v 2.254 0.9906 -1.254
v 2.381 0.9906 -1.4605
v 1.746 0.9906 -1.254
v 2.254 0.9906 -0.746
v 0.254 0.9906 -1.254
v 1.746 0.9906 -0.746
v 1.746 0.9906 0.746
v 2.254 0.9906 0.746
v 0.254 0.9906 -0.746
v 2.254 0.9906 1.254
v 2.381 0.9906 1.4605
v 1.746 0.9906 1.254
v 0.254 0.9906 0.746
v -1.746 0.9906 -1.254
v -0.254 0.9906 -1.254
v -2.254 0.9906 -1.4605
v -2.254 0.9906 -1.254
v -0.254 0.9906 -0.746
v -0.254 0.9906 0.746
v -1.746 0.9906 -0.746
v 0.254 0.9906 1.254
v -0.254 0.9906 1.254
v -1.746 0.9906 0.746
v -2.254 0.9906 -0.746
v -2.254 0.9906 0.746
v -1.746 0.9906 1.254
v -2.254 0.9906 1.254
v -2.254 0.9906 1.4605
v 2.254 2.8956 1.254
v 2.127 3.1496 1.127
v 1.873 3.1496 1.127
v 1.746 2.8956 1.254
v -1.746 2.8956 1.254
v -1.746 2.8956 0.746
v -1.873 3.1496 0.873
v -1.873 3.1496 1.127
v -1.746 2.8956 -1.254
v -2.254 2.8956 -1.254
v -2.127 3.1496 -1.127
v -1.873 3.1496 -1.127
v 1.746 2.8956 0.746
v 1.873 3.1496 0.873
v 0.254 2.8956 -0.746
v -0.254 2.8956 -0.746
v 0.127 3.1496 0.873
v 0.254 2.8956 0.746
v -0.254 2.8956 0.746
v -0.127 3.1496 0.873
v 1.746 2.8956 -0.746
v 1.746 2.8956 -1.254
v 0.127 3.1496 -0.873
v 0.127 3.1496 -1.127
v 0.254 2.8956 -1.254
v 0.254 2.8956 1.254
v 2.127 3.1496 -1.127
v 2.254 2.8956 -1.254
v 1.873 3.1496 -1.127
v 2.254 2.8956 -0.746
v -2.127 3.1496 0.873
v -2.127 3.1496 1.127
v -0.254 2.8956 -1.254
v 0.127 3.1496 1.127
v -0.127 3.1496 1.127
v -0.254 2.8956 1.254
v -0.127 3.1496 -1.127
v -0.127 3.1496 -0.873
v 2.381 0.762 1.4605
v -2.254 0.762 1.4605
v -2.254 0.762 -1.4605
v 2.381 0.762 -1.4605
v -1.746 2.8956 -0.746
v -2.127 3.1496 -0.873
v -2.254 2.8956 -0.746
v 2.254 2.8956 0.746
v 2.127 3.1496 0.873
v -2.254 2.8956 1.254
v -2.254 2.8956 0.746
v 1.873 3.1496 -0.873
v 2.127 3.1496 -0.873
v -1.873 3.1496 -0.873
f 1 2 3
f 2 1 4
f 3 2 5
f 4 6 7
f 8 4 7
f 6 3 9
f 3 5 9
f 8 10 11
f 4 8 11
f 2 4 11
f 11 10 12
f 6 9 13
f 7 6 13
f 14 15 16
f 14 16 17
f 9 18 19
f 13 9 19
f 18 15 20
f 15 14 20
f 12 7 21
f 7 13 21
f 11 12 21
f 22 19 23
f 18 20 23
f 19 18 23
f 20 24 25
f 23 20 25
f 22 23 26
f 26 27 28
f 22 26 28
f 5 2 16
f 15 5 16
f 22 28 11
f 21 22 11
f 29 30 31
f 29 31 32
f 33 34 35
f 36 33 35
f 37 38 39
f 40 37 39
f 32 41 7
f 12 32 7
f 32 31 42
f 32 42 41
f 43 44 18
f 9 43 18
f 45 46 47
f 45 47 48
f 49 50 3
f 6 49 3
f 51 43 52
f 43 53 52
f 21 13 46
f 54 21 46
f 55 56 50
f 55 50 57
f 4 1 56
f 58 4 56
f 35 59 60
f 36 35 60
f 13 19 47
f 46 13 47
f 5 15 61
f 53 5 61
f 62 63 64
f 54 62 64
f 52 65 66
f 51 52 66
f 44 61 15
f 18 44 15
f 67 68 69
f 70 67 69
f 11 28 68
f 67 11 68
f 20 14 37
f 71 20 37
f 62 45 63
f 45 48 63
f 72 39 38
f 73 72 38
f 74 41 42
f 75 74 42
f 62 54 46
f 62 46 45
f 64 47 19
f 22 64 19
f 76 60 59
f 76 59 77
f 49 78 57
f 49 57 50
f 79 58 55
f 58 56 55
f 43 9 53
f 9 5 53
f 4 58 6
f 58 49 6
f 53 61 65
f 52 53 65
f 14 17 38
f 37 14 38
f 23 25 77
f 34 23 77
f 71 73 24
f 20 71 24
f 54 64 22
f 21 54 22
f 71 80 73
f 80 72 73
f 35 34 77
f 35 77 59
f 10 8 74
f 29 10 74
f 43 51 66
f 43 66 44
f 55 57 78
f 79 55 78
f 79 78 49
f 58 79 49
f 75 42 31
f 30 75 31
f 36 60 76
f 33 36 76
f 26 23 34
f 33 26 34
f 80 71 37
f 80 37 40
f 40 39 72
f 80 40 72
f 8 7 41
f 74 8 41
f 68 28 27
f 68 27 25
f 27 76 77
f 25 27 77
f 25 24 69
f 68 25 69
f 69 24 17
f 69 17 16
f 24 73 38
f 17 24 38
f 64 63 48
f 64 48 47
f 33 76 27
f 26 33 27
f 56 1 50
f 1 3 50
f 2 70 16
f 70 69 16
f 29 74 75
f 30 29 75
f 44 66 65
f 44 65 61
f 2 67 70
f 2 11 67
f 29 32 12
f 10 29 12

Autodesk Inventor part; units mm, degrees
sketch "Sketch_2" plane through (-2.254, 0, 0) normal (1, 0, 0) x (0, 0, -1)
  line L0 (-1.4605, 0.762) -> (1.4605, 0.762)
  line L1 (1.4605, 0.762) -> (1.4605, 0.9906)
  line L2 (1.4605, 0.9906) -> (1.254, 0.9906)
  line L3 (1.254, 0.9906) -> (1.254, 2.8956)
  line L4 (1.254, 2.8956) -> (1.127, 3.1496)
  line L5 (1.127, 3.1496) -> (0.873, 3.1496)
  line L6 (0.873, 3.1496) -> (0.746, 2.8956)
  line L7 (0.746, 2.8956) -> (0.746, 0.9906)
  line L8 (0.746, 0.9906) -> (-0.746, 0.9906)
  line L9 (-0.746, 0.9906) -> (-0.746, 2.8956)
  line L10 (-0.746, 2.8956) -> (-0.873, 3.1496)
  line L11 (-0.873, 3.1496) -> (-1.127, 3.1496)
  line L12 (-1.127, 3.1496) -> (-1.254, 2.8956)
  line L13 (-1.254, 2.8956) -> (-1.254, 0.9906)
  line L14 (-1.254, 0.9906) -> (-1.4605, 0.9906)
  line L15 (-1.4605, 0.9906) -> (-1.4605, 0.762)
extrude "Extrusion1" add sketch "Sketch_2" along normal blind 4.635
sketch "Sketch_1" plane through (0, 0, 0) normal (0, 0, 1) x (1, 0, 0)
  line L0 (-109.4334, 38.1) -> (-109.4334, -38.1)
  line L1 (-109.4334, -38.1) -> (56.7986, -38.1)
  line L2 (56.7986, -38.1) -> (56.7986, 38.1)
  line L3 (56.7986, 38.1) -> (-109.4334, 38.1)
  line L4 (-100.4603, 0.762) -> (-100.2538, 0.762)
  line L5 (-100.2538, 0.762) -> (-100.2538, -2.032)
  line L6 (-100.2538, -2.032) -> (-100.1268, -2.286)
  line L7 (-100.1268, -2.286) -> (-99.8728, -2.286)
  line L8 (-99.8728, -2.286) -> (-99.7458, -2.032)
  line L9 (-99.7458, -2.032) -> (-99.7458, 0.762)
  line L10 (-99.7458, 0.762) -> (-98.2538, 0.762)
  line L11 (-98.2538, 0.762) -> (-98.2538, -2.032)
  line L12 (-98.2538, -2.032) -> (-98.1268, -2.286)
  line L13 (-98.1268, -2.286) -> (-97.8728, -2.286)
  line L14 (-97.8728, -2.286) -> (-97.7458, -2.032)
  line L15 (-97.7458, -2.032) -> (-97.7458, 0.762)
  line L16 (-97.7458, 0.762) -> (-96.2538, 0.762)
  line L17 (-96.2538, 0.762) -> (-96.2538, -2.032)
  line L18 (-96.2538, -2.032) -> (-96.1268, -2.286)
  line L19 (-96.1268, -2.286) -> (-95.8728, -2.286)
  line L20 (-95.8728, -2.286) -> (-95.7458, -2.032)
  line L21 (-95.7458, -2.032) -> (-95.7458, 0.762)
  line L22 (-95.7458, 0.762) -> (-94.2538, 0.762)
  line L23 (-94.2538, 0.762) -> (-94.2538, -2.032)
  line L24 (-94.2538, -2.032) -> (-94.1268, -2.286)
  line L25 (-94.1268, -2.286) -> (-93.8728, -2.286)
  line L26 (-93.8728, -2.286) -> (-93.7458, -2.032)
  line L27 (-93.7458, -2.032) -> (-93.7458, 0.762)
  line L28 (-93.7458, 0.762) -> (-92.2538, 0.762)
  line L29 (-92.2538, 0.762) -> (-92.2538, -2.032)
  line L30 (-92.2538, -2.032) -> (-92.1268, -2.286)
  line L31 (-92.1268, -2.286) -> (-91.8728, -2.286)
  line L32 (-91.8728, -2.286) -> (-91.7458, -2.032)
  line L33 (-91.7458, -2.032) -> (-91.7458, 0.762)
  line L34 (-91.7458, 0.762) -> (-90.2538, 0.762)
  line L35 (-90.2538, 0.762) -> (-90.2538, -2.032)
  line L36 (-90.2538, -2.032) -> (-90.1268, -2.286)
  line L37 (-90.1268, -2.286) -> (-89.8728, -2.286)
  line L38 (-89.8728, -2.286) -> (-89.7458, -2.032)
  line L39 (-89.7458, -2.032) -> (-89.7458, 0.762)
  line L40 (-89.7458, 0.762) -> (-88.2538, 0.762)
  line L41 (-88.2538, 0.762) -> (-88.2538, -2.032)
  line L42 (-88.2538, -2.032) -> (-88.1268, -2.286)
  line L43 (-88.1268, -2.286) -> (-87.8728, -2.286)
  line L44 (-87.8728, -2.286) -> (-87.7458, -2.032)
  line L45 (-87.7458, -2.032) -> (-87.7458, 0.762)
  line L46 (-87.7458, 0.762) -> (-86.2538, 0.762)
  line L47 (-86.2538, 0.762) -> (-86.2538, -2.032)
  line L48 (-86.2538, -2.032) -> (-86.1268, -2.286)
  line L49 (-86.1268, -2.286) -> (-85.8728, -2.286)
  line L50 (-85.8728, -2.286) -> (-85.7458, -2.032)
  line L51 (-85.7458, -2.032) -> (-85.7458, 0.762)
  line L52 (-85.7458, 0.762) -> (-84.2538, 0.762)
  line L53 (-84.2538, 0.762) -> (-84.2538, -2.032)
  line L54 (-84.2538, -2.032) -> (-84.1268, -2.286)
  line L55 (-84.1268, -2.286) -> (-83.8728, -2.286)
  line L56 (-83.8728, -2.286) -> (-83.7458, -2.032)
  line L57 (-83.7458, -2.032) -> (-83.7458, 0.762)
  line L58 (-83.7458, 0.762) -> (-82.2538, 0.762)
  line L59 (-82.2538, 0.762) -> (-82.2538, -2.032)
  line L60 (-82.2538, -2.032) -> (-82.1268, -2.286)
  line L61 (-82.1268, -2.286) -> (-81.8728, -2.286)
  line L62 (-81.8728, -2.286) -> (-81.7458, -2.032)
  line L63 (-81.7458, -2.032) -> (-81.7458, 0.762)
  line L64 (-81.7458, 0.762) -> (-80.2538, 0.762)
  line L65 (-80.2538, 0.762) -> (-80.2538, -2.032)
  line L66 (-80.2538, -2.032) -> (-80.1268, -2.286)
  line L67 (-80.1268, -2.286) -> (-79.8728, -2.286)
  line L68 (-79.8728, -2.286) -> (-79.7458, -2.032)
  line L69 (-79.7458, -2.032) -> (-79.7458, 0.762)
  line L70 (-79.7458, 0.762) -> (-78.2538, 0.762)
  line L71 (-78.2538, 0.762) -> (-78.2538, -2.032)
  line L72 (-78.2538, -2.032) -> (-78.1268, -2.286)
  line L73 (-78.1268, -2.286) -> (-77.8728, -2.286)
  line L74 (-77.8728, -2.286) -> (-77.7458, -2.032)
  line L75 (-77.7458, -2.032) -> (-77.7458, 0.762)
  line L76 (-77.7458, 0.762) -> (-76.2538, 0.762)
  line L77 (-76.2538, 0.762) -> (-76.2538, -2.032)
  line L78 (-76.2538, -2.032) -> (-76.1268, -2.286)
  line L79 (-76.1268, -2.286) -> (-75.8728, -2.286)
  line L80 (-75.8728, -2.286) -> (-75.7458, -2.032)
  line L81 (-75.7458, -2.032) -> (-75.7458, 0.762)
  line L82 (-75.7458, 0.762) -> (-74.2539, 0.762)
  line L83 (-74.2539, 0.762) -> (-74.2539, -2.032)
  line L84 (-74.2539, -2.032) -> (-74.1269, -2.286)
  line L85 (-74.1269, -2.286) -> (-73.8729, -2.286)
  line L86 (-73.8729, -2.286) -> (-73.7459, -2.032)
  line L87 (-73.7459, -2.032) -> (-73.7459, 0.762)
  line L88 (-73.7459, 0.762) -> (-72.2539, 0.762)
  line L89 (-72.2539, 0.762) -> (-72.2539, -2.032)
  line L90 (-72.2539, -2.032) -> (-72.1269, -2.286)
  line L91 (-72.1269, -2.286) -> (-71.8729, -2.286)
  line L92 (-71.8729, -2.286) -> (-71.7459, -2.032)
  line L93 (-71.7459, -2.032) -> (-71.7459, 0.762)
  line L94 (-71.7459, 0.762) -> (-70.2539, 0.762)
  line L95 (-70.2539, 0.762) -> (-70.2539, -2.032)
  line L96 (-70.2539, -2.032) -> (-70.1269, -2.286)
  line L97 (-70.1269, -2.286) -> (-69.8729, -2.286)
  line L98 (-69.8729, -2.286) -> (-69.7459, -2.032)
  line L99 (-69.7459, -2.032) -> (-69.7459, 0.762)
  line L100 (-69.7459, 0.762) -> (-68.2539, 0.762)
  line L101 (-68.2539, 0.762) -> (-68.2539, -2.032)
  line L102 (-68.2539, -2.032) -> (-68.1269, -2.286)
  line L103 (-68.1269, -2.286) -> (-67.8729, -2.286)
  line L104 (-67.8729, -2.286) -> (-67.7459, -2.032)
  line L105 (-67.7459, -2.032) -> (-67.7459, 0.762)
  line L106 (-67.7459, 0.762) -> (-66.2539, 0.762)
  line L107 (-66.2539, 0.762) -> (-66.2539, -2.032)
  line L108 (-66.2539, -2.032) -> (-66.1269, -2.286)
  line L109 (-66.1269, -2.286) -> (-65.8729, -2.286)
  line L110 (-65.8729, -2.286) -> (-65.7459, -2.032)
  line L111 (-65.7459, -2.032) -> (-65.7459, 0.762)
  line L112 (-65.7459, 0.762) -> (-64.2539, 0.762)
  line L113 (-64.2539, 0.762) -> (-64.2539, -2.032)
  line L114 (-64.2539, -2.032) -> (-64.1269, -2.286)
  line L115 (-64.1269, -2.286) -> (-63.8729, -2.286)
  line L116 (-63.8729, -2.286) -> (-63.7459, -2.032)
  line L117 (-63.7459, -2.032) -> (-63.7459, 0.762)
  line L118 (-63.7459, 0.762) -> (-62.2539, 0.762)
  line L119 (-62.2539, 0.762) -> (-62.2539, -2.032)
  line L120 (-62.2539, -2.032) -> (-62.1269, -2.286)
  line L121 (-62.1269, -2.286) -> (-61.8729, -2.286)
  line L122 (-61.8729, -2.286) -> (-61.7459, -2.032)
  line L123 (-61.7459, -2.032) -> (-61.7459, 0.762)
  line L124 (-61.7459, 0.762) -> (-60.2539, 0.762)
  line L125 (-60.2539, 0.762) -> (-60.2539, -2.032)
  line L126 (-60.2539, -2.032) -> (-60.1269, -2.286)
  line L127 (-60.1269, -2.286) -> (-59.8729, -2.286)
  line L128 (-59.8729, -2.286) -> (-59.7459, -2.032)
  line L129 (-59.7459, -2.032) -> (-59.7459, 0.762)
  line L130 (-59.7459, 0.762) -> (-58.2539, 0.762)
  line L131 (-58.2539, 0.762) -> (-58.2539, -2.032)
  line L132 (-58.2539, -2.032) -> (-58.1269, -2.286)
  line L133 (-58.1269, -2.286) -> (-57.8729, -2.286)
  line L134 (-57.8729, -2.286) -> (-57.7459, -2.032)
  line L135 (-57.7459, -2.032) -> (-57.7459, 0.762)
  line L136 (-57.7459, 0.762) -> (-56.2539, 0.762)
  line L137 (-56.2539, 0.762) -> (-56.2539, -2.032)
  line L138 (-56.2539, -2.032) -> (-56.1269, -2.286)
  line L139 (-56.1269, -2.286) -> (-55.8729, -2.286)
  line L140 (-55.8729, -2.286) -> (-55.7459, -2.032)
  line L141 (-55.7459, -2.032) -> (-55.7459, 0.762)
  line L142 (-55.7459, 0.762) -> (-54.2539, 0.762)
  line L143 (-54.2539, 0.762) -> (-54.2539, -2.032)
  line L144 (-54.2539, -2.032) -> (-54.1269, -2.286)
  line L145 (-54.1269, -2.286) -> (-53.8729, -2.286)
  line L146 (-53.8729, -2.286) -> (-53.7459, -2.032)
  line L147 (-53.7459, -2.032) -> (-53.7459, 0.762)
  line L148 (-53.7459, 0.762) -> (-52.2539, 0.762)
  line L149 (-52.2539, 0.762) -> (-52.2539, -2.032)
  line L150 (-52.2539, -2.032) -> (-52.1269, -2.286)
  line L151 (-52.1269, -2.286) -> (-51.8729, -2.286)
  line L152 (-51.8729, -2.286) -> (-51.7459, -2.032)
  line L153 (-51.7459, -2.032) -> (-51.7459, 0.762)
  line L154 (-51.7459, 0.762) -> (-50.2539, 0.762)
  line L155 (-50.2539, 0.762) -> (-50.2539, -2.032)
  line L156 (-50.2539, -2.032) -> (-50.1269, -2.286)
  line L157 (-50.1269, -2.286) -> (-49.8729, -2.286)
  line L158 (-49.8729, -2.286) -> (-49.7459, -2.032)
  line L159 (-49.7459, -2.032) -> (-49.7459, 0.762)
  line L160 (-49.7459, 0.762) -> (-48.2539, 0.762)
  line L161 (-48.2539, 0.762) -> (-48.2539, -2.032)
  line L162 (-48.2539, -2.032) -> (-48.1269, -2.286)
  line L163 (-48.1269, -2.286) -> (-47.8729, -2.286)
  line L164 (-47.8729, -2.286) -> (-47.7459, -2.032)
  line L165 (-47.7459, -2.032) -> (-47.7459, 0.762)
  line L166 (-47.7459, 0.762) -> (-46.2539, 0.762)
  line L167 (-46.2539, 0.762) -> (-46.2539, -2.032)
  line L168 (-46.2539, -2.032) -> (-46.1269, -2.286)
  line L169 (-46.1269, -2.286) -> (-45.8729, -2.286)
  line L170 (-45.8729, -2.286) -> (-45.7459, -2.032)
  line L171 (-45.7459, -2.032) -> (-45.7459, 0.762)
  line L172 (-45.7459, 0.762) -> (-44.2539, 0.762)
  line L173 (-44.2539, 0.762) -> (-44.2539, -2.032)
  line L174 (-44.2539, -2.032) -> (-44.1269, -2.286)
  line L175 (-44.1269, -2.286) -> (-43.8729, -2.286)
  line L176 (-43.8729, -2.286) -> (-43.7459, -2.032)
  line L177 (-43.7459, -2.032) -> (-43.7459, 0.762)
  line L178 (-43.7459, 0.762) -> (-42.2539, 0.762)
  line L179 (-42.2539, 0.762) -> (-42.2539, -2.032)
  line L180 (-42.2539, -2.032) -> (-42.1269, -2.286)
  line L181 (-42.1269, -2.286) -> (-41.8729, -2.286)
  line L182 (-41.8729, -2.286) -> (-41.7459, -2.032)
  line L183 (-41.7459, -2.032) -> (-41.7459, 0.762)
  line L184 (-41.7459, 0.762) -> (-40.2539, 0.762)
  line L185 (-40.2539, 0.762) -> (-40.2539, -2.032)
  line L186 (-40.2539, -2.032) -> (-40.1269, -2.286)
  line L187 (-40.1269, -2.286) -> (-39.8729, -2.286)
  line L188 (-39.8729, -2.286) -> (-39.7459, -2.032)
  line L189 (-39.7459, -2.032) -> (-39.7459, 0.762)
  line L190 (-39.7459, 0.762) -> (-38.2539, 0.762)
  line L191 (-38.2539, 0.762) -> (-38.2539, -2.032)
  line L192 (-38.2539, -2.032) -> (-38.1269, -2.286)
  line L193 (-38.1269, -2.286) -> (-37.8729, -2.286)
  line L194 (-37.8729, -2.286) -> (-37.7459, -2.032)
  line L195 (-37.7459, -2.032) -> (-37.7459, 0.762)
  line L196 (-37.7459, 0.762) -> (-36.2539, 0.762)
  line L197 (-36.2539, 0.762) -> (-36.2539, -2.032)
  line L198 (-36.2539, -2.032) -> (-36.1269, -2.286)
  line L199 (-36.1269, -2.286) -> (-35.8729, -2.286)
  line L200 (-35.8729, -2.286) -> (-35.7459, -2.032)
  line L201 (-35.7459, -2.032) -> (-35.7459, 0.762)
  line L202 (-35.7459, 0.762) -> (-34.2539, 0.762)
  line L203 (-34.2539, 0.762) -> (-34.2539, -2.032)
  line L204 (-34.2539, -2.032) -> (-34.1269, -2.286)
  line L205 (-34.1269, -2.286) -> (-33.8729, -2.286)
  line L206 (-33.8729, -2.286) -> (-33.7459, -2.032)
  line L207 (-33.7459, -2.032) -> (-33.7459, 0.762)
  line L208 (-33.7459, 0.762) -> (-32.2539, 0.762)
  line L209 (-32.2539, 0.762) -> (-32.2539, -2.032)
  line L210 (-32.2539, -2.032) -> (-32.1269, -2.286)
  line L211 (-32.1269, -2.286) -> (-31.8729, -2.286)
  line L212 (-31.8729, -2.286) -> (-31.7459, -2.032)
  line L213 (-31.7459, -2.032) -> (-31.7459, 0.762)
  line L214 (-31.7459, 0.762) -> (-30.2539, 0.762)
  line L215 (-30.2539, 0.762) -> (-30.2539, -2.032)
  line L216 (-30.2539, -2.032) -> (-30.1269, -2.286)
  line L217 (-30.1269, -2.286) -> (-29.8729, -2.286)
  line L218 (-29.8729, -2.286) -> (-29.7459, -2.032)
  line L219 (-29.7459, -2.032) -> (-29.7459, 0.762)
  line L220 (-29.7459, 0.762) -> (-28.2539, 0.762)
  line L221 (-28.2539, 0.762) -> (-28.2539, -2.032)
  line L222 (-28.2539, -2.032) -> (-28.1269, -2.286)
  line L223 (-28.1269, -2.286) -> (-27.8729, -2.286)
  line L224 (-27.8729, -2.286) -> (-27.7459, -2.032)
  line L225 (-27.7459, -2.032) -> (-27.7459, 0.762)
  line L226 (-27.7459, 0.762) -> (-26.2539, 0.762)
  line L227 (-26.2539, 0.762) -> (-26.2539, -2.032)
  line L228 (-26.2539, -2.032) -> (-26.1269, -2.286)
  line L229 (-26.1269, -2.286) -> (-25.8729, -2.286)
  line L230 (-25.8729, -2.286) -> (-25.7459, -2.032)
  line L231 (-25.7459, -2.032) -> (-25.7459, 0.762)
  line L232 (-25.7459, 0.762) -> (-24.254, 0.762)
  line L233 (-24.254, 0.762) -> (-24.254, -2.032)
  line L234 (-24.254, -2.032) -> (-24.127, -2.286)
  line L235 (-24.127, -2.286) -> (-23.873, -2.286)
  line L236 (-23.873, -2.286) -> (-23.746, -2.032)
  line L237 (-23.746, -2.032) -> (-23.746, 0.762)
  line L238 (-23.746, 0.762) -> (-22.254, 0.762)
  line L239 (-22.254, 0.762) -> (-22.254, -2.032)
  line L240 (-22.254, -2.032) -> (-22.127, -2.286)
  line L241 (-22.127, -2.286) -> (-21.873, -2.286)
  line L242 (-21.873, -2.286) -> (-21.746, -2.032)
  line L243 (-21.746, -2.032) -> (-21.746, 0.762)
  line L244 (-21.746, 0.762) -> (-20.254, 0.762)
  line L245 (-20.254, 0.762) -> (-20.254, -2.032)
  line L246 (-20.254, -2.032) -> (-20.127, -2.286)
  line L247 (-20.127, -2.286) -> (-19.873, -2.286)
  line L248 (-19.873, -2.286) -> (-19.746, -2.032)
  line L249 (-19.746, -2.032) -> (-19.746, 0.762)
  line L250 (-19.746, 0.762) -> (-18.254, 0.762)
  line L251 (-18.254, 0.762) -> (-18.254, -2.032)
  line L252 (-18.254, -2.032) -> (-18.127, -2.286)
  line L253 (-18.127, -2.286) -> (-17.873, -2.286)
  line L254 (-17.873, -2.286) -> (-17.746, -2.032)
  line L255 (-17.746, -2.032) -> (-17.746, 0.762)
  line L256 (-17.746, 0.762) -> (-16.254, 0.762)
  line L257 (-16.254, 0.762) -> (-16.254, -2.032)
  line L258 (-16.254, -2.032) -> (-16.127, -2.286)
  line L259 (-16.127, -2.286) -> (-15.873, -2.286)
  line L260 (-15.873, -2.286) -> (-15.746, -2.032)
  line L261 (-15.746, -2.032) -> (-15.746, 0.762)
  line L262 (-15.746, 0.762) -> (-14.254, 0.762)
  line L263 (-14.254, 0.762) -> (-14.254, -2.032)
  line L264 (-14.254, -2.032) -> (-14.127, -2.286)
  line L265 (-14.127, -2.286) -> (-13.873, -2.286)
  line L266 (-13.873, -2.286) -> (-13.746, -2.032)
  line L267 (-13.746, -2.032) -> (-13.746, 0.762)
  line L268 (-13.746, 0.762) -> (-12.254, 0.762)
  line L269 (-12.254, 0.762) -> (-12.254, -2.032)
  line L270 (-12.254, -2.032) -> (-12.127, -2.286)
  line L271 (-12.127, -2.286) -> (-11.873, -2.286)
  line L272 (-11.873, -2.286) -> (-11.746, -2.032)
  line L273 (-11.746, -2.032) -> (-11.746, 0.762)
  line L274 (-11.746, 0.762) -> (-10.254, 0.762)
  line L275 (-10.254, 0.762) -> (-10.254, -2.032)
  line L276 (-10.254, -2.032) -> (-10.127, -2.286)
  line L277 (-10.127, -2.286) -> (-9.873, -2.286)
  line L278 (-9.873, -2.286) -> (-9.746, -2.032)
  line L279 (-9.746, -2.032) -> (-9.746, 0.762)
  line L280 (-9.746, 0.762) -> (-8.254, 0.762)
  line L281 (-8.254, 0.762) -> (-8.254, -2.032)
  line L282 (-8.254, -2.032) -> (-8.127, -2.286)
  line L283 (-8.127, -2.286) -> (-7.873, -2.286)
  line L284 (-7.873, -2.286) -> (-7.746, -2.032)
  line L285 (-7.746, -2.032) -> (-7.746, 0.762)
  line L286 (-7.746, 0.762) -> (-6.254, 0.762)
  line L287 (-6.254, 0.762) -> (-6.254, -2.032)
  line L288 (-6.254, -2.032) -> (-6.127, -2.286)
  line L289 (-6.127, -2.286) -> (-5.873, -2.286)
  line L290 (-5.873, -2.286) -> (-5.746, -2.032)
  line L291 (-5.746, -2.032) -> (-5.746, 0.762)
  line L292 (-5.746, 0.762) -> (-4.254, 0.762)
  line L293 (-4.254, 0.762) -> (-4.254, -2.032)
  line L294 (-4.254, -2.032) -> (-4.127, -2.286)
  line L295 (-4.127, -2.286) -> (-3.873, -2.286)
  line L296 (-3.873, -2.286) -> (-3.746, -2.032)
  line L297 (-3.746, -2.032) -> (-3.746, 0.762)
  line L298 (-3.746, 0.762) -> (-2.254, 0.762)
  line L299 (-2.254, 0.762) -> (-2.254, -2.032)
  line L300 (-2.254, -2.032) -> (-2.127, -2.286)
  line L301 (-2.127, -2.286) -> (-1.873, -2.286)
  line L302 (-1.873, -2.286) -> (-1.746, -2.032)
  line L303 (-1.746, -2.032) -> (-1.746, 0.762)
  line L304 (-1.746, 0.762) -> (-0.254, 0.762)
  line L305 (-0.254, 0.762) -> (-0.254, -2.032)
  line L306 (-0.254, -2.032) -> (-0.127, -2.286)
  line L307 (-0.127, -2.286) -> (0.127, -2.286)
  line L308 (0.127, -2.286) -> (0.254, -2.032)
  line L309 (0.254, -2.032) -> (0.254, 0.762)
  line L310 (0.254, 0.762) -> (1.746, 0.762)
  line L311 (1.746, 0.762) -> (1.746, -2.032)
  line L312 (1.746, -2.032) -> (1.873, -2.286)
  line L313 (1.873, -2.286) -> (2.127, -2.286)
  line L314 (2.127, -2.286) -> (2.254, -2.032)
  line L315 (2.254, -2.032) -> (2.254, 0.762)
  line L316 (2.254, 0.762) -> (2.4605, 0.762)
  line L317 (2.4605, 0.762) -> (2.4605, 0.9906)
  line L318 (2.4605, 0.9906) -> (2.254, 0.9906)
  line L319 (2.254, 0.9906) -> (2.254, 2.8956)
  line L320 (2.254, 2.8956) -> (2.127, 3.1496)
  line L321 (2.127, 3.1496) -> (1.873, 3.1496)
  line L322 (1.873, 3.1496) -> (1.746, 2.8956)
  line L323 (1.746, 2.8956) -> (1.746, 0.9906)
  line L324 (1.746, 0.9906) -> (0.254, 0.9906)
  line L325 (0.254, 0.9906) -> (0.254, 2.8956)
  line L326 (0.254, 2.8956) -> (0.127, 3.1496)
  line L327 (0.127, 3.1496) -> (-0.127, 3.1496)
  line L328 (-0.127, 3.1496) -> (-0.254, 2.8956)
  line L329 (-0.254, 2.8956) -> (-0.254, 0.9906)
  line L330 (-0.254, 0.9906) -> (-1.746, 0.9906)
  line L331 (-1.746, 0.9906) -> (-1.746, 2.8956)
  line L332 (-1.746, 2.8956) -> (-1.873, 3.1496)
  line L333 (-1.873, 3.1496) -> (-2.127, 3.1496)
  line L334 (-2.127, 3.1496) -> (-2.254, 2.8956)
  line L335 (-2.254, 2.8956) -> (-2.254, 0.9906)
  line L336 (-2.254, 0.9906) -> (-3.746, 0.9906)
  line L337 (-3.746, 0.9906) -> (-3.746, 2.8956)
  line L338 (-3.746, 2.8956) -> (-3.873, 3.1496)
  line L339 (-3.873, 3.1496) -> (-4.127, 3.1496)
  line L340 (-4.127, 3.1496) -> (-4.254, 2.8956)
  line L341 (-4.254, 2.8956) -> (-4.254, 0.9906)
  line L342 (-4.254, 0.9906) -> (-5.746, 0.9906)
  line L343 (-5.746, 0.9906) -> (-5.746, 2.8956)
  line L344 (-5.746, 2.8956) -> (-5.873, 3.1496)
  line L345 (-5.873, 3.1496) -> (-6.127, 3.1496)
  line L346 (-6.127, 3.1496) -> (-6.254, 2.8956)
  line L347 (-6.254, 2.8956) -> (-6.254, 0.9906)
  line L348 (-6.254, 0.9906) -> (-7.746, 0.9906)
  line L349 (-7.746, 0.9906) -> (-7.746, 2.8956)
  line L350 (-7.746, 2.8956) -> (-7.873, 3.1496)
  line L351 (-7.873, 3.1496) -> (-8.127, 3.1496)
  line L352 (-8.127, 3.1496) -> (-8.254, 2.8956)
  line L353 (-8.254, 2.8956) -> (-8.254, 0.9906)
  line L354 (-8.254, 0.9906) -> (-9.746, 0.9906)
  line L355 (-9.746, 0.9906) -> (-9.746, 2.8956)
  line L356 (-9.746, 2.8956) -> (-9.873, 3.1496)
  line L357 (-9.873, 3.1496) -> (-10.127, 3.1496)
  line L358 (-10.127, 3.1496) -> (-10.254, 2.8956)
  line L359 (-10.254, 2.8956) -> (-10.254, 0.9906)
  line L360 (-10.254, 0.9906) -> (-11.746, 0.9906)
  line L361 (-11.746, 0.9906) -> (-11.746, 2.8956)
  line L362 (-11.746, 2.8956) -> (-11.873, 3.1496)
  line L363 (-11.873, 3.1496) -> (-12.127, 3.1496)
  line L364 (-12.127, 3.1496) -> (-12.254, 2.8956)
  line L365 (-12.254, 2.8956) -> (-12.254, 0.9906)
  line L366 (-12.254, 0.9906) -> (-13.746, 0.9906)
  line L367 (-13.746, 0.9906) -> (-13.746, 2.8956)
  line L368 (-13.746, 2.8956) -> (-13.873, 3.1496)
  line L369 (-13.873, 3.1496) -> (-14.127, 3.1496)
  line L370 (-14.127, 3.1496) -> (-14.254, 2.8956)
  line L371 (-14.254, 2.8956) -> (-14.254, 0.9906)
  line L372 (-14.254, 0.9906) -> (-15.746, 0.9906)
  line L373 (-15.746, 0.9906) -> (-15.746, 2.8956)
  line L374 (-15.746, 2.8956) -> (-15.873, 3.1496)
  line L375 (-15.873, 3.1496) -> (-16.127, 3.1496)
  line L376 (-16.127, 3.1496) -> (-16.254, 2.8956)
  line L377 (-16.254, 2.8956) -> (-16.254, 0.9906)
  line L378 (-16.254, 0.9906) -> (-17.746, 0.9906)
  line L379 (-17.746, 0.9906) -> (-17.746, 2.8956)
  line L380 (-17.746, 2.8956) -> (-17.873, 3.1496)
  line L381 (-17.873, 3.1496) -> (-18.127, 3.1496)
  line L382 (-18.127, 3.1496) -> (-18.254, 2.8956)
  line L383 (-18.254, 2.8956) -> (-18.254, 0.9906)
  line L384 (-18.254, 0.9906) -> (-19.746, 0.9906)
  line L385 (-19.746, 0.9906) -> (-19.746, 2.8956)
  line L386 (-19.746, 2.8956) -> (-19.873, 3.1496)
  line L387 (-19.873, 3.1496) -> (-20.127, 3.1496)
  line L388 (-20.127, 3.1496) -> (-20.254, 2.8956)
  line L389 (-20.254, 2.8956) -> (-20.254, 0.9906)
  line L390 (-20.254, 0.9906) -> (-21.746, 0.9906)
  line L391 (-21.746, 0.9906) -> (-21.746, 2.8956)
  line L392 (-21.746, 2.8956) -> (-21.873, 3.1496)
  line L393 (-21.873, 3.1496) -> (-22.127, 3.1496)
  line L394 (-22.127, 3.1496) -> (-22.254, 2.8956)
  line L395 (-22.254, 2.8956) -> (-22.254, 0.9906)
  line L396 (-22.254, 0.9906) -> (-23.746, 0.9906)
  line L397 (-23.746, 0.9906) -> (-23.746, 2.8956)
  line L398 (-23.746, 2.8956) -> (-23.873, 3.1496)
  line L399 (-23.873, 3.1496) -> (-24.127, 3.1496)
  line L400 (-24.127, 3.1496) -> (-24.254, 2.8956)
  line L401 (-24.254, 2.8956) -> (-24.254, 0.9906)
  line L402 (-24.254, 0.9906) -> (-25.7459, 0.9906)
  line L403 (-25.7459, 0.9906) -> (-25.7459, 2.8956)
  line L404 (-25.7459, 2.8956) -> (-25.8729, 3.1496)
  line L405 (-25.8729, 3.1496) -> (-26.1269, 3.1496)
  line L406 (-26.1269, 3.1496) -> (-26.2539, 2.8956)
  line L407 (-26.2539, 2.8956) -> (-26.2539, 0.9906)
  line L408 (-26.2539, 0.9906) -> (-27.7459, 0.9906)
  line L409 (-27.7459, 0.9906) -> (-27.7459, 2.8956)
  line L410 (-27.7459, 2.8956) -> (-27.8729, 3.1496)
  line L411 (-27.8729, 3.1496) -> (-28.1269, 3.1496)
  line L412 (-28.1269, 3.1496) -> (-28.2539, 2.8956)
  line L413 (-28.2539, 2.8956) -> (-28.2539, 0.9906)
  line L414 (-28.2539, 0.9906) -> (-29.7459, 0.9906)
  line L415 (-29.7459, 0.9906) -> (-29.7459, 2.8956)
  line L416 (-29.7459, 2.8956) -> (-29.8729, 3.1496)
  line L417 (-29.8729, 3.1496) -> (-30.1269, 3.1496)
  line L418 (-30.1269, 3.1496) -> (-30.2539, 2.8956)
  line L419 (-30.2539, 2.8956) -> (-30.2539, 0.9906)
  line L420 (-30.2539, 0.9906) -> (-31.7459, 0.9906)
  line L421 (-31.7459, 0.9906) -> (-31.7459, 2.8956)
  line L422 (-31.7459, 2.8956) -> (-31.8729, 3.1496)
  line L423 (-31.8729, 3.1496) -> (-32.1269, 3.1496)
  line L424 (-32.1269, 3.1496) -> (-32.2539, 2.8956)
  line L425 (-32.2539, 2.8956) -> (-32.2539, 0.9906)
  line L426 (-32.2539, 0.9906) -> (-33.7459, 0.9906)
  line L427 (-33.7459, 0.9906) -> (-33.7459, 2.8956)
  line L428 (-33.7459, 2.8956) -> (-33.8729, 3.1496)
  line L429 (-33.8729, 3.1496) -> (-34.1269, 3.1496)
  line L430 (-34.1269, 3.1496) -> (-34.2539, 2.8956)
  line L431 (-34.2539, 2.8956) -> (-34.2539, 0.9906)
  line L432 (-34.2539, 0.9906) -> (-35.7459, 0.9906)
  line L433 (-35.7459, 0.9906) -> (-35.7459, 2.8956)
  line L434 (-35.7459, 2.8956) -> (-35.8729, 3.1496)
  line L435 (-35.8729, 3.1496) -> (-36.1269, 3.1496)
  line L436 (-36.1269, 3.1496) -> (-36.2539, 2.8956)
  line L437 (-36.2539, 2.8956) -> (-36.2539, 0.9906)
  line L438 (-36.2539, 0.9906) -> (-37.7459, 0.9906)
  line L439 (-37.7459, 0.9906) -> (-37.7459, 2.8956)
  line L440 (-37.7459, 2.8956) -> (-37.8729, 3.1496)
  line L441 (-37.8729, 3.1496) -> (-38.1269, 3.1496)
  line L442 (-38.1269, 3.1496) -> (-38.2539, 2.8956)
  line L443 (-38.2539, 2.8956) -> (-38.2539, 0.9906)
  line L444 (-38.2539, 0.9906) -> (-39.7459, 0.9906)
  line L445 (-39.7459, 0.9906) -> (-39.7459, 2.8956)
  line L446 (-39.7459, 2.8956) -> (-39.8729, 3.1496)
  line L447 (-39.8729, 3.1496) -> (-40.1269, 3.1496)
  line L448 (-40.1269, 3.1496) -> (-40.2539, 2.8956)
  line L449 (-40.2539, 2.8956) -> (-40.2539, 0.9906)
  line L450 (-40.2539, 0.9906) -> (-41.7459, 0.9906)
  line L451 (-41.7459, 0.9906) -> (-41.7459, 2.8956)
  line L452 (-41.7459, 2.8956) -> (-41.8729, 3.1496)
  line L453 (-41.8729, 3.1496) -> (-42.1269, 3.1496)
  line L454 (-42.1269, 3.1496) -> (-42.2539, 2.8956)
  line L455 (-42.2539, 2.8956) -> (-42.2539, 0.9906)
  line L456 (-42.2539, 0.9906) -> (-43.7459, 0.9906)
  line L457 (-43.7459, 0.9906) -> (-43.7459, 2.8956)
  line L458 (-43.7459, 2.8956) -> (-43.8729, 3.1496)
  line L459 (-43.8729, 3.1496) -> (-44.1269, 3.1496)
  line L460 (-44.1269, 3.1496) -> (-44.2539, 2.8956)
  line L461 (-44.2539, 2.8956) -> (-44.2539, 0.9906)
  line L462 (-44.2539, 0.9906) -> (-45.7459, 0.9906)
  line L463 (-45.7459, 0.9906) -> (-45.7459, 2.8956)
  line L464 (-45.7459, 2.8956) -> (-45.8729, 3.1496)
  line L465 (-45.8729, 3.1496) -> (-46.1269, 3.1496)
  line L466 (-46.1269, 3.1496) -> (-46.2539, 2.8956)
  line L467 (-46.2539, 2.8956) -> (-46.2539, 0.9906)
  line L468 (-46.2539, 0.9906) -> (-47.7459, 0.9906)
  line L469 (-47.7459, 0.9906) -> (-47.7459, 2.8956)
  line L470 (-47.7459, 2.8956) -> (-47.8729, 3.1496)
  line L471 (-47.8729, 3.1496) -> (-48.1269, 3.1496)
  line L472 (-48.1269, 3.1496) -> (-48.2539, 2.8956)
  line L473 (-48.2539, 2.8956) -> (-48.2539, 0.9906)
  line L474 (-48.2539, 0.9906) -> (-49.7459, 0.9906)
  line L475 (-49.7459, 0.9906) -> (-49.7459, 2.8956)
  line L476 (-49.7459, 2.8956) -> (-49.8729, 3.1496)
  line L477 (-49.8729, 3.1496) -> (-50.1269, 3.1496)
  line L478 (-50.1269, 3.1496) -> (-50.2539, 2.8956)
  line L479 (-50.2539, 2.8956) -> (-50.2539, 0.9906)
  line L480 (-50.2539, 0.9906) -> (-51.7459, 0.9906)
  line L481 (-51.7459, 0.9906) -> (-51.7459, 2.8956)
  line L482 (-51.7459, 2.8956) -> (-51.8729, 3.1496)
  line L483 (-51.8729, 3.1496) -> (-52.1269, 3.1496)
  line L484 (-52.1269, 3.1496) -> (-52.2539, 2.8956)
  line L485 (-52.2539, 2.8956) -> (-52.2539, 0.9906)
  line L486 (-52.2539, 0.9906) -> (-53.7459, 0.9906)
  line L487 (-53.7459, 0.9906) -> (-53.7459, 2.8956)
  line L488 (-53.7459, 2.8956) -> (-53.8729, 3.1496)
  line L489 (-53.8729, 3.1496) -> (-54.1269, 3.1496)
  line L490 (-54.1269, 3.1496) -> (-54.2539, 2.8956)
  line L491 (-54.2539, 2.8956) -> (-54.2539, 0.9906)
  line L492 (-54.2539, 0.9906) -> (-55.7459, 0.9906)
  line L493 (-55.7459, 0.9906) -> (-55.7459, 2.8956)
  line L494 (-55.7459, 2.8956) -> (-55.8729, 3.1496)
  line L495 (-55.8729, 3.1496) -> (-56.1269, 3.1496)
  line L496 (-56.1269, 3.1496) -> (-56.2539, 2.8956)
  line L497 (-56.2539, 2.8956) -> (-56.2539, 0.9906)
  line L498 (-56.2539, 0.9906) -> (-57.7459, 0.9906)
  line L499 (-57.7459, 0.9906) -> (-57.7459, 2.8956)
  line L500 (-57.7459, 2.8956) -> (-57.8729, 3.1496)
  line L501 (-57.8729, 3.1496) -> (-58.1269, 3.1496)
  line L502 (-58.1269, 3.1496) -> (-58.2539, 2.8956)
  line L503 (-58.2539, 2.8956) -> (-58.2539, 0.9906)
  line L504 (-58.2539, 0.9906) -> (-59.7459, 0.9906)
  line L505 (-59.7459, 0.9906) -> (-59.7459, 2.8956)
  line L506 (-59.7459, 2.8956) -> (-59.8729, 3.1496)
  line L507 (-59.8729, 3.1496) -> (-60.1269, 3.1496)
  line L508 (-60.1269, 3.1496) -> (-60.2539, 2.8956)
  line L509 (-60.2539, 2.8956) -> (-60.2539, 0.9906)
  line L510 (-60.2539, 0.9906) -> (-61.7459, 0.9906)
  line L511 (-61.7459, 0.9906) -> (-61.7459, 2.8956)
  line L512 (-61.7459, 2.8956) -> (-61.8729, 3.1496)
  line L513 (-61.8729, 3.1496) -> (-62.1269, 3.1496)
  line L514 (-62.1269, 3.1496) -> (-62.2539, 2.8956)
  line L515 (-62.2539, 2.8956) -> (-62.2539, 0.9906)
  line L516 (-62.2539, 0.9906) -> (-63.7459, 0.9906)
  line L517 (-63.7459, 0.9906) -> (-63.7459, 2.8956)
  line L518 (-63.7459, 2.8956) -> (-63.8729, 3.1496)
  line L519 (-63.8729, 3.1496) -> (-64.1269, 3.1496)
  line L520 (-64.1269, 3.1496) -> (-64.2539, 2.8956)
  line L521 (-64.2539, 2.8956) -> (-64.2539, 0.9906)
  line L522 (-64.2539, 0.9906) -> (-65.7459, 0.9906)
  line L523 (-65.7459, 0.9906) -> (-65.7459, 2.8956)
  line L524 (-65.7459, 2.8956) -> (-65.8729, 3.1496)
  line L525 (-65.8729, 3.1496) -> (-66.1269, 3.1496)
  line L526 (-66.1269, 3.1496) -> (-66.2539, 2.8956)
  line L527 (-66.2539, 2.8956) -> (-66.2539, 0.9906)
  line L528 (-66.2539, 0.9906) -> (-67.7459, 0.9906)
  line L529 (-67.7459, 0.9906) -> (-67.7459, 2.8956)
  line L530 (-67.7459, 2.8956) -> (-67.8729, 3.1496)
  line L531 (-67.8729, 3.1496) -> (-68.1269, 3.1496)
  line L532 (-68.1269, 3.1496) -> (-68.2539, 2.8956)
  line L533 (-68.2539, 2.8956) -> (-68.2539, 0.9906)
  line L534 (-68.2539, 0.9906) -> (-69.7459, 0.9906)
  line L535 (-69.7459, 0.9906) -> (-69.7459, 2.8956)
  line L536 (-69.7459, 2.8956) -> (-69.8729, 3.1496)
  line L537 (-69.8729, 3.1496) -> (-70.1269, 3.1496)
  line L538 (-70.1269, 3.1496) -> (-70.2539, 2.8956)
  line L539 (-70.2539, 2.8956) -> (-70.2539, 0.9906)
  line L540 (-70.2539, 0.9906) -> (-71.7459, 0.9906)
  line L541 (-71.7459, 0.9906) -> (-71.7459, 2.8956)
  line L542 (-71.7459, 2.8956) -> (-71.8729, 3.1496)
  line L543 (-71.8729, 3.1496) -> (-72.1269, 3.1496)
  line L544 (-72.1269, 3.1496) -> (-72.2539, 2.8956)
  line L545 (-72.2539, 2.8956) -> (-72.2539, 0.9906)
  line L546 (-72.2539, 0.9906) -> (-73.7459, 0.9906)
  line L547 (-73.7459, 0.9906) -> (-73.7459, 2.8956)
  line L548 (-73.7459, 2.8956) -> (-73.8729, 3.1496)
  line L549 (-73.8729, 3.1496) -> (-74.1269, 3.1496)
  line L550 (-74.1269, 3.1496) -> (-74.2539, 2.8956)
  line L551 (-74.2539, 2.8956) -> (-74.2539, 0.9906)
  line L552 (-74.2539, 0.9906) -> (-75.7458, 0.9906)
  line L553 (-75.7458, 0.9906) -> (-75.7458, 2.8956)
  line L554 (-75.7458, 2.8956) -> (-75.8728, 3.1496)
  line L555 (-75.8728, 3.1496) -> (-76.1268, 3.1496)
  line L556 (-76.1268, 3.1496) -> (-76.2538, 2.8956)
  line L557 (-76.2538, 2.8956) -> (-76.2538, 0.9906)
  line L558 (-76.2538, 0.9906) -> (-77.7458, 0.9906)
  line L559 (-77.7458, 0.9906) -> (-77.7458, 2.8956)
  line L560 (-77.7458, 2.8956) -> (-77.8728, 3.1496)
  line L561 (-77.8728, 3.1496) -> (-78.1268, 3.1496)
  line L562 (-78.1268, 3.1496) -> (-78.2538, 2.8956)
  line L563 (-78.2538, 2.8956) -> (-78.2538, 0.9906)
  line L564 (-78.2538, 0.9906) -> (-79.7458, 0.9906)
  line L565 (-79.7458, 0.9906) -> (-79.7458, 2.8956)
  line L566 (-79.7458, 2.8956) -> (-79.8728, 3.1496)
  line L567 (-79.8728, 3.1496) -> (-80.1268, 3.1496)
  line L568 (-80.1268, 3.1496) -> (-80.2538, 2.8956)
  line L569 (-80.2538, 2.8956) -> (-80.2538, 0.9906)
  line L570 (-80.2538, 0.9906) -> (-81.7458, 0.9906)
  line L571 (-81.7458, 0.9906) -> (-81.7458, 2.8956)
  line L572 (-81.7458, 2.8956) -> (-81.8728, 3.1496)
  line L573 (-81.8728, 3.1496) -> (-82.1268, 3.1496)
  line L574 (-82.1268, 3.1496) -> (-82.2538, 2.8956)
  line L575 (-82.2538, 2.8956) -> (-82.2538, 0.9906)
  line L576 (-82.2538, 0.9906) -> (-83.7458, 0.9906)
  line L577 (-83.7458, 0.9906) -> (-83.7458, 2.8956)
  line L578 (-83.7458, 2.8956) -> (-83.8728, 3.1496)
  line L579 (-83.8728, 3.1496) -> (-84.1268, 3.1496)
  line L580 (-84.1268, 3.1496) -> (-84.2538, 2.8956)
  line L581 (-84.2538, 2.8956) -> (-84.2538, 0.9906)
  line L582 (-84.2538, 0.9906) -> (-85.7458, 0.9906)
  line L583 (-85.7458, 0.9906) -> (-85.7458, 2.8956)
  line L584 (-85.7458, 2.8956) -> (-85.8728, 3.1496)
  line L585 (-85.8728, 3.1496) -> (-86.1268, 3.1496)
  line L586 (-86.1268, 3.1496) -> (-86.2538, 2.8956)
  line L587 (-86.2538, 2.8956) -> (-86.2538, 0.9906)
  line L588 (-86.2538, 0.9906) -> (-87.7458, 0.9906)
  line L589 (-87.7458, 0.9906) -> (-87.7458, 2.8956)
  line L590 (-87.7458, 2.8956) -> (-87.8728, 3.1496)
  line L591 (-87.8728, 3.1496) -> (-88.1268, 3.1496)
  line L592 (-88.1268, 3.1496) -> (-88.2538, 2.8956)
  line L593 (-88.2538, 2.8956) -> (-88.2538, 0.9906)
  line L594 (-88.2538, 0.9906) -> (-89.7458, 0.9906)
  line L595 (-89.7458, 0.9906) -> (-89.7458, 2.8956)
  line L596 (-89.7458, 2.8956) -> (-89.8728, 3.1496)
  line L597 (-89.8728, 3.1496) -> (-90.1268, 3.1496)
  line L598 (-90.1268, 3.1496) -> (-90.2538, 2.8956)
  line L599 (-90.2538, 2.8956) -> (-90.2538, 0.9906)
  line L600 (-90.2538, 0.9906) -> (-91.7458, 0.9906)
  line L601 (-91.7458, 0.9906) -> (-91.7458, 2.8956)
  line L602 (-91.7458, 2.8956) -> (-91.8728, 3.1496)
  line L603 (-91.8728, 3.1496) -> (-92.1268, 3.1496)
  line L604 (-92.1268, 3.1496) -> (-92.2538, 2.8956)
  line L605 (-92.2538, 2.8956) -> (-92.2538, 0.9906)
  line L606 (-92.2538, 0.9906) -> (-93.7458, 0.9906)
  line L607 (-93.7458, 0.9906) -> (-93.7458, 2.8956)
  line L608 (-93.7458, 2.8956) -> (-93.8728, 3.1496)
  line L609 (-93.8728, 3.1496) -> (-94.1268, 3.1496)
  line L610 (-94.1268, 3.1496) -> (-94.2538, 2.8956)
  line L611 (-94.2538, 2.8956) -> (-94.2538, 0.9906)
  line L612 (-94.2538, 0.9906) -> (-95.7458, 0.9906)
  line L613 (-95.7458, 0.9906) -> (-95.7458, 2.8956)
  line L614 (-95.7458, 2.8956) -> (-95.8728, 3.1496)
  line L615 (-95.8728, 3.1496) -> (-96.1268, 3.1496)
  line L616 (-96.1268, 3.1496) -> (-96.2538, 2.8956)
  line L617 (-96.2538, 2.8956) -> (-96.2538, 0.9906)
  line L618 (-96.2538, 0.9906) -> (-97.7458, 0.9906)
  line L619 (-97.7458, 0.9906) -> (-97.7458, 2.8956)
  line L620 (-97.7458, 2.8956) -> (-97.8728, 3.1496)
  line L621 (-97.8728, 3.1496) -> (-98.1268, 3.1496)
  line L622 (-98.1268, 3.1496) -> (-98.2538, 2.8956)
  line L623 (-98.2538, 2.8956) -> (-98.2538, 0.9906)
  line L624 (-98.2538, 0.9906) -> (-99.7458, 0.9906)
  line L625 (-99.7458, 0.9906) -> (-99.7458, 2.8956)
  line L626 (-99.7458, 2.8956) -> (-99.8728, 3.1496)
  line L627 (-99.8728, 3.1496) -> (-100.1268, 3.1496)
  line L628 (-100.1268, 3.1496) -> (-100.2538, 2.8956)
  line L629 (-100.2538, 2.8956) -> (-100.2538, 0.9906)
  line L630 (-100.2538, 0.9906) -> (-100.4603, 0.9906)
  line L631 (-100.4603, 0.9906) -> (-100.4603, 0.762)
extrude "Extrusion2" cut sketch "Sketch_1" along normal mid plane 15.24
ref_plane "0_XY" through (0, 0, 0) normal (0, 1, 0) x (1, 0, 0)
ref_plane "0_YZ" through (0, 0, 0) normal (1, 0, 0) x (0, 0, -1)
ref_plane "0_ZX" through (0, 0, 0) normal (0, 0, -1) x (0, 1, 0)
properties part number "TMM-103-05-F-D_pins1"
